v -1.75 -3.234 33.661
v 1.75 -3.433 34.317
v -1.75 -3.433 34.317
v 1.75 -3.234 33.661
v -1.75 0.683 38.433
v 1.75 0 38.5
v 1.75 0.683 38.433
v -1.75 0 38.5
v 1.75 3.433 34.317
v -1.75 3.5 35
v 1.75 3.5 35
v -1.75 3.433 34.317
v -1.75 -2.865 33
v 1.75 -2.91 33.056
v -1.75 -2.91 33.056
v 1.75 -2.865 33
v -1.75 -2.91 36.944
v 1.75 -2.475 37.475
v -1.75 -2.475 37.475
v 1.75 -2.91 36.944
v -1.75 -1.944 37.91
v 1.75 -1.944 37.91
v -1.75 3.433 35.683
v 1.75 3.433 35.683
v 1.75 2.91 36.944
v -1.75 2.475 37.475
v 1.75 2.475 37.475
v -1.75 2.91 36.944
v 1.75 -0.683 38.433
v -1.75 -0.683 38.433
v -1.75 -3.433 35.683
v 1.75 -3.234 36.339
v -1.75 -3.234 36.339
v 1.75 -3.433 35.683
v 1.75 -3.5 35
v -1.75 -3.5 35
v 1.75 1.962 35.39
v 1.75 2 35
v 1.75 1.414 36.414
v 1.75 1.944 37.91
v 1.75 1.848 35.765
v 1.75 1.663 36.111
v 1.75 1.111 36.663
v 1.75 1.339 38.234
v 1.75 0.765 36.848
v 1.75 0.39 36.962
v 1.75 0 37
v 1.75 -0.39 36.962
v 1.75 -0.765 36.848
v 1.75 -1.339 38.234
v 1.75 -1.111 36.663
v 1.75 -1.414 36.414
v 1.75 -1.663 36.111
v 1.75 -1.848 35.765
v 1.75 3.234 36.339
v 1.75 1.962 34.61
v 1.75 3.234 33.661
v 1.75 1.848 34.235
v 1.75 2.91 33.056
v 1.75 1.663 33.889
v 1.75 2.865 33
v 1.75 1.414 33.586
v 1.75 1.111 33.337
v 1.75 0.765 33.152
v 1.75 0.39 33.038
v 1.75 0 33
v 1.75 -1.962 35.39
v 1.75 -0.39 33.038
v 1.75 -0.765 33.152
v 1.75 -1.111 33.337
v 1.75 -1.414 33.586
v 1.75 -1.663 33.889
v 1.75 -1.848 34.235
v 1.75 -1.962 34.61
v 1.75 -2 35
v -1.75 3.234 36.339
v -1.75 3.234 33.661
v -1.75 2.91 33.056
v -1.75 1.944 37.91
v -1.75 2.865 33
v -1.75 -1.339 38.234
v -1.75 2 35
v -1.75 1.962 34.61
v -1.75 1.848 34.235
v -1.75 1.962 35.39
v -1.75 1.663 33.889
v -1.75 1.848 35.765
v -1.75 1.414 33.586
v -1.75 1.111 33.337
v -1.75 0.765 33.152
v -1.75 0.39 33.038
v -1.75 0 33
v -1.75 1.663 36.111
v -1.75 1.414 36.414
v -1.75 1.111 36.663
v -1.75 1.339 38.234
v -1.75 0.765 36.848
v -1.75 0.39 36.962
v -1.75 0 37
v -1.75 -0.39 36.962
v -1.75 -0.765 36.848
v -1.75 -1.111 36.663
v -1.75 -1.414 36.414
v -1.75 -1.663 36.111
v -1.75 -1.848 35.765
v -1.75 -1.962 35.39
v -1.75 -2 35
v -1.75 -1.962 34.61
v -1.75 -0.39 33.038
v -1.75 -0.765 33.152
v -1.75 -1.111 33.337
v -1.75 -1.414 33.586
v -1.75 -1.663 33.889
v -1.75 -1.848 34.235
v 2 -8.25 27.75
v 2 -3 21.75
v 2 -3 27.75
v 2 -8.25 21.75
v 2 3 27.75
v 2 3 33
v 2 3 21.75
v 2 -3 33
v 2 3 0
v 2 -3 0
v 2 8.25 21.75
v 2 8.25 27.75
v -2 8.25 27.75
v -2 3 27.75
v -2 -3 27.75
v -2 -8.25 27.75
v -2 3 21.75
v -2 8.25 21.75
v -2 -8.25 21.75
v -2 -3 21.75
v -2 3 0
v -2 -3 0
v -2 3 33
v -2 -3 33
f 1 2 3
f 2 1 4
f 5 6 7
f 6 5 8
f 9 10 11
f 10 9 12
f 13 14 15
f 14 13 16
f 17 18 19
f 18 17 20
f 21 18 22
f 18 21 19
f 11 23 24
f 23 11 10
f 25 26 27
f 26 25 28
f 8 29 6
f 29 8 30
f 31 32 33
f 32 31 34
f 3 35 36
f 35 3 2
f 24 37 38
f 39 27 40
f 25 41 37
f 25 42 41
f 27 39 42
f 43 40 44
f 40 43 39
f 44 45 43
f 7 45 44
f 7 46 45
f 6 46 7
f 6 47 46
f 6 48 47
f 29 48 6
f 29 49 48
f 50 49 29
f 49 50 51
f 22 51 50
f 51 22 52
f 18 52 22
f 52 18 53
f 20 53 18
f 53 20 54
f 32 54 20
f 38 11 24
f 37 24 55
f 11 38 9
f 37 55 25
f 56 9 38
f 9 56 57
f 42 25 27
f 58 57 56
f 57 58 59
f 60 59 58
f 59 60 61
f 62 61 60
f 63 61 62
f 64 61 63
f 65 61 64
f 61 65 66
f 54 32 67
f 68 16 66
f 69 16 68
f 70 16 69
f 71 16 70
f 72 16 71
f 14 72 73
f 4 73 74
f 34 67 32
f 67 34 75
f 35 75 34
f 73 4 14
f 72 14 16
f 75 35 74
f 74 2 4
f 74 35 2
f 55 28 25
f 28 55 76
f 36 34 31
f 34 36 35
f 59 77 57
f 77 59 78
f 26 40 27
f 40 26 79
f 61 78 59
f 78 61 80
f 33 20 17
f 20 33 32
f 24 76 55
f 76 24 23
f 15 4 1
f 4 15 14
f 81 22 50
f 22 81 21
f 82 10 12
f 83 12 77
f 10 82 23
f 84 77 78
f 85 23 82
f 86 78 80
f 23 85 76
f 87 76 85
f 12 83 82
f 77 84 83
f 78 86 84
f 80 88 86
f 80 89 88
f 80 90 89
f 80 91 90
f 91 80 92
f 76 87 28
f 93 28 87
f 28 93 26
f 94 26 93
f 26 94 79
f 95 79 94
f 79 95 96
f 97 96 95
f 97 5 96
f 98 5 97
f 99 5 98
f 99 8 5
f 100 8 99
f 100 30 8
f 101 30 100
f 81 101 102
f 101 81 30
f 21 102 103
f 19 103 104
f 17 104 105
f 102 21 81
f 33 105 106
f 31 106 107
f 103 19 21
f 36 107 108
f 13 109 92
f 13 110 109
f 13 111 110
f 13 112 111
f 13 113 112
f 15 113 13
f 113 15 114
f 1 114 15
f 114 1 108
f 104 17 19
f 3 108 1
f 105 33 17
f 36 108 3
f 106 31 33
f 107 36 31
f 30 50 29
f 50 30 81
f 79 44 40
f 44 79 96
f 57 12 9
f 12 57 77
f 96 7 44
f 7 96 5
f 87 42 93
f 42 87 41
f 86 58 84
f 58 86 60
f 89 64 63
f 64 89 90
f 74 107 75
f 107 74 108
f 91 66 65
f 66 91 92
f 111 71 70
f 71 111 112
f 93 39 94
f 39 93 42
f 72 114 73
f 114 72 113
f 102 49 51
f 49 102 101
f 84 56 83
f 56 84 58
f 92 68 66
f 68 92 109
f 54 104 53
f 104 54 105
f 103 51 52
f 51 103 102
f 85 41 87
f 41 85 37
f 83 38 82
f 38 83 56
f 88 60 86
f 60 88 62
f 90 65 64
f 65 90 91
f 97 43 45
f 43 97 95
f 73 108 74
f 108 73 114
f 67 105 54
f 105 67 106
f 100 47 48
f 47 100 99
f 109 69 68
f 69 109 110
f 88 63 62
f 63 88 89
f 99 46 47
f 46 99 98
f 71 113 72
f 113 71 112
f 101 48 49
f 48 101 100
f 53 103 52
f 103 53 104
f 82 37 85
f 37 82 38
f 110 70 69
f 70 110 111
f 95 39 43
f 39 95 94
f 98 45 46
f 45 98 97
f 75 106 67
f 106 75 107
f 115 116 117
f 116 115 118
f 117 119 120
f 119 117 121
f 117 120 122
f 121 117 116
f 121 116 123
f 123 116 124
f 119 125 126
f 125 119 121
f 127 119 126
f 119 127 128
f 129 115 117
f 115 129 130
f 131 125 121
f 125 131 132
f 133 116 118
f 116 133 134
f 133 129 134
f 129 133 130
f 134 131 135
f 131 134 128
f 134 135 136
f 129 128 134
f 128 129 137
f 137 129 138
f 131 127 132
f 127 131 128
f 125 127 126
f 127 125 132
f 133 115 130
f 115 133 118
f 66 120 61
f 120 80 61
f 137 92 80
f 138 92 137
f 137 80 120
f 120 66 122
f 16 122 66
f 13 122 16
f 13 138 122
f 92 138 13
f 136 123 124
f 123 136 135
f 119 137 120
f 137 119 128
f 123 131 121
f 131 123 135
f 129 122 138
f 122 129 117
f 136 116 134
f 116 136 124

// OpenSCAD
$fn=32;

crossBody = [4, 6, 33];

union() {
    translate([0, 0, crossBody.z + 2]) {
        difference() {
            rotate([0, 90, 0]) cylinder(h=crossBody.x -.5, r=3.5, center=true);
            rotate([0, 90, 0]) cylinder(h=crossBody.x, r=2, center=true);
        }
    }

    translate([0, 0, crossBody.z * .75]) 
        cube(
            [crossBody.x, crossBody.z * .5, crossBody.y], 
            center=true
        );

    translate([
        -1 * crossBody.x / 2, 
        -1 * crossBody.y / 2, 
        0
    ]) cube(crossBody);
}
